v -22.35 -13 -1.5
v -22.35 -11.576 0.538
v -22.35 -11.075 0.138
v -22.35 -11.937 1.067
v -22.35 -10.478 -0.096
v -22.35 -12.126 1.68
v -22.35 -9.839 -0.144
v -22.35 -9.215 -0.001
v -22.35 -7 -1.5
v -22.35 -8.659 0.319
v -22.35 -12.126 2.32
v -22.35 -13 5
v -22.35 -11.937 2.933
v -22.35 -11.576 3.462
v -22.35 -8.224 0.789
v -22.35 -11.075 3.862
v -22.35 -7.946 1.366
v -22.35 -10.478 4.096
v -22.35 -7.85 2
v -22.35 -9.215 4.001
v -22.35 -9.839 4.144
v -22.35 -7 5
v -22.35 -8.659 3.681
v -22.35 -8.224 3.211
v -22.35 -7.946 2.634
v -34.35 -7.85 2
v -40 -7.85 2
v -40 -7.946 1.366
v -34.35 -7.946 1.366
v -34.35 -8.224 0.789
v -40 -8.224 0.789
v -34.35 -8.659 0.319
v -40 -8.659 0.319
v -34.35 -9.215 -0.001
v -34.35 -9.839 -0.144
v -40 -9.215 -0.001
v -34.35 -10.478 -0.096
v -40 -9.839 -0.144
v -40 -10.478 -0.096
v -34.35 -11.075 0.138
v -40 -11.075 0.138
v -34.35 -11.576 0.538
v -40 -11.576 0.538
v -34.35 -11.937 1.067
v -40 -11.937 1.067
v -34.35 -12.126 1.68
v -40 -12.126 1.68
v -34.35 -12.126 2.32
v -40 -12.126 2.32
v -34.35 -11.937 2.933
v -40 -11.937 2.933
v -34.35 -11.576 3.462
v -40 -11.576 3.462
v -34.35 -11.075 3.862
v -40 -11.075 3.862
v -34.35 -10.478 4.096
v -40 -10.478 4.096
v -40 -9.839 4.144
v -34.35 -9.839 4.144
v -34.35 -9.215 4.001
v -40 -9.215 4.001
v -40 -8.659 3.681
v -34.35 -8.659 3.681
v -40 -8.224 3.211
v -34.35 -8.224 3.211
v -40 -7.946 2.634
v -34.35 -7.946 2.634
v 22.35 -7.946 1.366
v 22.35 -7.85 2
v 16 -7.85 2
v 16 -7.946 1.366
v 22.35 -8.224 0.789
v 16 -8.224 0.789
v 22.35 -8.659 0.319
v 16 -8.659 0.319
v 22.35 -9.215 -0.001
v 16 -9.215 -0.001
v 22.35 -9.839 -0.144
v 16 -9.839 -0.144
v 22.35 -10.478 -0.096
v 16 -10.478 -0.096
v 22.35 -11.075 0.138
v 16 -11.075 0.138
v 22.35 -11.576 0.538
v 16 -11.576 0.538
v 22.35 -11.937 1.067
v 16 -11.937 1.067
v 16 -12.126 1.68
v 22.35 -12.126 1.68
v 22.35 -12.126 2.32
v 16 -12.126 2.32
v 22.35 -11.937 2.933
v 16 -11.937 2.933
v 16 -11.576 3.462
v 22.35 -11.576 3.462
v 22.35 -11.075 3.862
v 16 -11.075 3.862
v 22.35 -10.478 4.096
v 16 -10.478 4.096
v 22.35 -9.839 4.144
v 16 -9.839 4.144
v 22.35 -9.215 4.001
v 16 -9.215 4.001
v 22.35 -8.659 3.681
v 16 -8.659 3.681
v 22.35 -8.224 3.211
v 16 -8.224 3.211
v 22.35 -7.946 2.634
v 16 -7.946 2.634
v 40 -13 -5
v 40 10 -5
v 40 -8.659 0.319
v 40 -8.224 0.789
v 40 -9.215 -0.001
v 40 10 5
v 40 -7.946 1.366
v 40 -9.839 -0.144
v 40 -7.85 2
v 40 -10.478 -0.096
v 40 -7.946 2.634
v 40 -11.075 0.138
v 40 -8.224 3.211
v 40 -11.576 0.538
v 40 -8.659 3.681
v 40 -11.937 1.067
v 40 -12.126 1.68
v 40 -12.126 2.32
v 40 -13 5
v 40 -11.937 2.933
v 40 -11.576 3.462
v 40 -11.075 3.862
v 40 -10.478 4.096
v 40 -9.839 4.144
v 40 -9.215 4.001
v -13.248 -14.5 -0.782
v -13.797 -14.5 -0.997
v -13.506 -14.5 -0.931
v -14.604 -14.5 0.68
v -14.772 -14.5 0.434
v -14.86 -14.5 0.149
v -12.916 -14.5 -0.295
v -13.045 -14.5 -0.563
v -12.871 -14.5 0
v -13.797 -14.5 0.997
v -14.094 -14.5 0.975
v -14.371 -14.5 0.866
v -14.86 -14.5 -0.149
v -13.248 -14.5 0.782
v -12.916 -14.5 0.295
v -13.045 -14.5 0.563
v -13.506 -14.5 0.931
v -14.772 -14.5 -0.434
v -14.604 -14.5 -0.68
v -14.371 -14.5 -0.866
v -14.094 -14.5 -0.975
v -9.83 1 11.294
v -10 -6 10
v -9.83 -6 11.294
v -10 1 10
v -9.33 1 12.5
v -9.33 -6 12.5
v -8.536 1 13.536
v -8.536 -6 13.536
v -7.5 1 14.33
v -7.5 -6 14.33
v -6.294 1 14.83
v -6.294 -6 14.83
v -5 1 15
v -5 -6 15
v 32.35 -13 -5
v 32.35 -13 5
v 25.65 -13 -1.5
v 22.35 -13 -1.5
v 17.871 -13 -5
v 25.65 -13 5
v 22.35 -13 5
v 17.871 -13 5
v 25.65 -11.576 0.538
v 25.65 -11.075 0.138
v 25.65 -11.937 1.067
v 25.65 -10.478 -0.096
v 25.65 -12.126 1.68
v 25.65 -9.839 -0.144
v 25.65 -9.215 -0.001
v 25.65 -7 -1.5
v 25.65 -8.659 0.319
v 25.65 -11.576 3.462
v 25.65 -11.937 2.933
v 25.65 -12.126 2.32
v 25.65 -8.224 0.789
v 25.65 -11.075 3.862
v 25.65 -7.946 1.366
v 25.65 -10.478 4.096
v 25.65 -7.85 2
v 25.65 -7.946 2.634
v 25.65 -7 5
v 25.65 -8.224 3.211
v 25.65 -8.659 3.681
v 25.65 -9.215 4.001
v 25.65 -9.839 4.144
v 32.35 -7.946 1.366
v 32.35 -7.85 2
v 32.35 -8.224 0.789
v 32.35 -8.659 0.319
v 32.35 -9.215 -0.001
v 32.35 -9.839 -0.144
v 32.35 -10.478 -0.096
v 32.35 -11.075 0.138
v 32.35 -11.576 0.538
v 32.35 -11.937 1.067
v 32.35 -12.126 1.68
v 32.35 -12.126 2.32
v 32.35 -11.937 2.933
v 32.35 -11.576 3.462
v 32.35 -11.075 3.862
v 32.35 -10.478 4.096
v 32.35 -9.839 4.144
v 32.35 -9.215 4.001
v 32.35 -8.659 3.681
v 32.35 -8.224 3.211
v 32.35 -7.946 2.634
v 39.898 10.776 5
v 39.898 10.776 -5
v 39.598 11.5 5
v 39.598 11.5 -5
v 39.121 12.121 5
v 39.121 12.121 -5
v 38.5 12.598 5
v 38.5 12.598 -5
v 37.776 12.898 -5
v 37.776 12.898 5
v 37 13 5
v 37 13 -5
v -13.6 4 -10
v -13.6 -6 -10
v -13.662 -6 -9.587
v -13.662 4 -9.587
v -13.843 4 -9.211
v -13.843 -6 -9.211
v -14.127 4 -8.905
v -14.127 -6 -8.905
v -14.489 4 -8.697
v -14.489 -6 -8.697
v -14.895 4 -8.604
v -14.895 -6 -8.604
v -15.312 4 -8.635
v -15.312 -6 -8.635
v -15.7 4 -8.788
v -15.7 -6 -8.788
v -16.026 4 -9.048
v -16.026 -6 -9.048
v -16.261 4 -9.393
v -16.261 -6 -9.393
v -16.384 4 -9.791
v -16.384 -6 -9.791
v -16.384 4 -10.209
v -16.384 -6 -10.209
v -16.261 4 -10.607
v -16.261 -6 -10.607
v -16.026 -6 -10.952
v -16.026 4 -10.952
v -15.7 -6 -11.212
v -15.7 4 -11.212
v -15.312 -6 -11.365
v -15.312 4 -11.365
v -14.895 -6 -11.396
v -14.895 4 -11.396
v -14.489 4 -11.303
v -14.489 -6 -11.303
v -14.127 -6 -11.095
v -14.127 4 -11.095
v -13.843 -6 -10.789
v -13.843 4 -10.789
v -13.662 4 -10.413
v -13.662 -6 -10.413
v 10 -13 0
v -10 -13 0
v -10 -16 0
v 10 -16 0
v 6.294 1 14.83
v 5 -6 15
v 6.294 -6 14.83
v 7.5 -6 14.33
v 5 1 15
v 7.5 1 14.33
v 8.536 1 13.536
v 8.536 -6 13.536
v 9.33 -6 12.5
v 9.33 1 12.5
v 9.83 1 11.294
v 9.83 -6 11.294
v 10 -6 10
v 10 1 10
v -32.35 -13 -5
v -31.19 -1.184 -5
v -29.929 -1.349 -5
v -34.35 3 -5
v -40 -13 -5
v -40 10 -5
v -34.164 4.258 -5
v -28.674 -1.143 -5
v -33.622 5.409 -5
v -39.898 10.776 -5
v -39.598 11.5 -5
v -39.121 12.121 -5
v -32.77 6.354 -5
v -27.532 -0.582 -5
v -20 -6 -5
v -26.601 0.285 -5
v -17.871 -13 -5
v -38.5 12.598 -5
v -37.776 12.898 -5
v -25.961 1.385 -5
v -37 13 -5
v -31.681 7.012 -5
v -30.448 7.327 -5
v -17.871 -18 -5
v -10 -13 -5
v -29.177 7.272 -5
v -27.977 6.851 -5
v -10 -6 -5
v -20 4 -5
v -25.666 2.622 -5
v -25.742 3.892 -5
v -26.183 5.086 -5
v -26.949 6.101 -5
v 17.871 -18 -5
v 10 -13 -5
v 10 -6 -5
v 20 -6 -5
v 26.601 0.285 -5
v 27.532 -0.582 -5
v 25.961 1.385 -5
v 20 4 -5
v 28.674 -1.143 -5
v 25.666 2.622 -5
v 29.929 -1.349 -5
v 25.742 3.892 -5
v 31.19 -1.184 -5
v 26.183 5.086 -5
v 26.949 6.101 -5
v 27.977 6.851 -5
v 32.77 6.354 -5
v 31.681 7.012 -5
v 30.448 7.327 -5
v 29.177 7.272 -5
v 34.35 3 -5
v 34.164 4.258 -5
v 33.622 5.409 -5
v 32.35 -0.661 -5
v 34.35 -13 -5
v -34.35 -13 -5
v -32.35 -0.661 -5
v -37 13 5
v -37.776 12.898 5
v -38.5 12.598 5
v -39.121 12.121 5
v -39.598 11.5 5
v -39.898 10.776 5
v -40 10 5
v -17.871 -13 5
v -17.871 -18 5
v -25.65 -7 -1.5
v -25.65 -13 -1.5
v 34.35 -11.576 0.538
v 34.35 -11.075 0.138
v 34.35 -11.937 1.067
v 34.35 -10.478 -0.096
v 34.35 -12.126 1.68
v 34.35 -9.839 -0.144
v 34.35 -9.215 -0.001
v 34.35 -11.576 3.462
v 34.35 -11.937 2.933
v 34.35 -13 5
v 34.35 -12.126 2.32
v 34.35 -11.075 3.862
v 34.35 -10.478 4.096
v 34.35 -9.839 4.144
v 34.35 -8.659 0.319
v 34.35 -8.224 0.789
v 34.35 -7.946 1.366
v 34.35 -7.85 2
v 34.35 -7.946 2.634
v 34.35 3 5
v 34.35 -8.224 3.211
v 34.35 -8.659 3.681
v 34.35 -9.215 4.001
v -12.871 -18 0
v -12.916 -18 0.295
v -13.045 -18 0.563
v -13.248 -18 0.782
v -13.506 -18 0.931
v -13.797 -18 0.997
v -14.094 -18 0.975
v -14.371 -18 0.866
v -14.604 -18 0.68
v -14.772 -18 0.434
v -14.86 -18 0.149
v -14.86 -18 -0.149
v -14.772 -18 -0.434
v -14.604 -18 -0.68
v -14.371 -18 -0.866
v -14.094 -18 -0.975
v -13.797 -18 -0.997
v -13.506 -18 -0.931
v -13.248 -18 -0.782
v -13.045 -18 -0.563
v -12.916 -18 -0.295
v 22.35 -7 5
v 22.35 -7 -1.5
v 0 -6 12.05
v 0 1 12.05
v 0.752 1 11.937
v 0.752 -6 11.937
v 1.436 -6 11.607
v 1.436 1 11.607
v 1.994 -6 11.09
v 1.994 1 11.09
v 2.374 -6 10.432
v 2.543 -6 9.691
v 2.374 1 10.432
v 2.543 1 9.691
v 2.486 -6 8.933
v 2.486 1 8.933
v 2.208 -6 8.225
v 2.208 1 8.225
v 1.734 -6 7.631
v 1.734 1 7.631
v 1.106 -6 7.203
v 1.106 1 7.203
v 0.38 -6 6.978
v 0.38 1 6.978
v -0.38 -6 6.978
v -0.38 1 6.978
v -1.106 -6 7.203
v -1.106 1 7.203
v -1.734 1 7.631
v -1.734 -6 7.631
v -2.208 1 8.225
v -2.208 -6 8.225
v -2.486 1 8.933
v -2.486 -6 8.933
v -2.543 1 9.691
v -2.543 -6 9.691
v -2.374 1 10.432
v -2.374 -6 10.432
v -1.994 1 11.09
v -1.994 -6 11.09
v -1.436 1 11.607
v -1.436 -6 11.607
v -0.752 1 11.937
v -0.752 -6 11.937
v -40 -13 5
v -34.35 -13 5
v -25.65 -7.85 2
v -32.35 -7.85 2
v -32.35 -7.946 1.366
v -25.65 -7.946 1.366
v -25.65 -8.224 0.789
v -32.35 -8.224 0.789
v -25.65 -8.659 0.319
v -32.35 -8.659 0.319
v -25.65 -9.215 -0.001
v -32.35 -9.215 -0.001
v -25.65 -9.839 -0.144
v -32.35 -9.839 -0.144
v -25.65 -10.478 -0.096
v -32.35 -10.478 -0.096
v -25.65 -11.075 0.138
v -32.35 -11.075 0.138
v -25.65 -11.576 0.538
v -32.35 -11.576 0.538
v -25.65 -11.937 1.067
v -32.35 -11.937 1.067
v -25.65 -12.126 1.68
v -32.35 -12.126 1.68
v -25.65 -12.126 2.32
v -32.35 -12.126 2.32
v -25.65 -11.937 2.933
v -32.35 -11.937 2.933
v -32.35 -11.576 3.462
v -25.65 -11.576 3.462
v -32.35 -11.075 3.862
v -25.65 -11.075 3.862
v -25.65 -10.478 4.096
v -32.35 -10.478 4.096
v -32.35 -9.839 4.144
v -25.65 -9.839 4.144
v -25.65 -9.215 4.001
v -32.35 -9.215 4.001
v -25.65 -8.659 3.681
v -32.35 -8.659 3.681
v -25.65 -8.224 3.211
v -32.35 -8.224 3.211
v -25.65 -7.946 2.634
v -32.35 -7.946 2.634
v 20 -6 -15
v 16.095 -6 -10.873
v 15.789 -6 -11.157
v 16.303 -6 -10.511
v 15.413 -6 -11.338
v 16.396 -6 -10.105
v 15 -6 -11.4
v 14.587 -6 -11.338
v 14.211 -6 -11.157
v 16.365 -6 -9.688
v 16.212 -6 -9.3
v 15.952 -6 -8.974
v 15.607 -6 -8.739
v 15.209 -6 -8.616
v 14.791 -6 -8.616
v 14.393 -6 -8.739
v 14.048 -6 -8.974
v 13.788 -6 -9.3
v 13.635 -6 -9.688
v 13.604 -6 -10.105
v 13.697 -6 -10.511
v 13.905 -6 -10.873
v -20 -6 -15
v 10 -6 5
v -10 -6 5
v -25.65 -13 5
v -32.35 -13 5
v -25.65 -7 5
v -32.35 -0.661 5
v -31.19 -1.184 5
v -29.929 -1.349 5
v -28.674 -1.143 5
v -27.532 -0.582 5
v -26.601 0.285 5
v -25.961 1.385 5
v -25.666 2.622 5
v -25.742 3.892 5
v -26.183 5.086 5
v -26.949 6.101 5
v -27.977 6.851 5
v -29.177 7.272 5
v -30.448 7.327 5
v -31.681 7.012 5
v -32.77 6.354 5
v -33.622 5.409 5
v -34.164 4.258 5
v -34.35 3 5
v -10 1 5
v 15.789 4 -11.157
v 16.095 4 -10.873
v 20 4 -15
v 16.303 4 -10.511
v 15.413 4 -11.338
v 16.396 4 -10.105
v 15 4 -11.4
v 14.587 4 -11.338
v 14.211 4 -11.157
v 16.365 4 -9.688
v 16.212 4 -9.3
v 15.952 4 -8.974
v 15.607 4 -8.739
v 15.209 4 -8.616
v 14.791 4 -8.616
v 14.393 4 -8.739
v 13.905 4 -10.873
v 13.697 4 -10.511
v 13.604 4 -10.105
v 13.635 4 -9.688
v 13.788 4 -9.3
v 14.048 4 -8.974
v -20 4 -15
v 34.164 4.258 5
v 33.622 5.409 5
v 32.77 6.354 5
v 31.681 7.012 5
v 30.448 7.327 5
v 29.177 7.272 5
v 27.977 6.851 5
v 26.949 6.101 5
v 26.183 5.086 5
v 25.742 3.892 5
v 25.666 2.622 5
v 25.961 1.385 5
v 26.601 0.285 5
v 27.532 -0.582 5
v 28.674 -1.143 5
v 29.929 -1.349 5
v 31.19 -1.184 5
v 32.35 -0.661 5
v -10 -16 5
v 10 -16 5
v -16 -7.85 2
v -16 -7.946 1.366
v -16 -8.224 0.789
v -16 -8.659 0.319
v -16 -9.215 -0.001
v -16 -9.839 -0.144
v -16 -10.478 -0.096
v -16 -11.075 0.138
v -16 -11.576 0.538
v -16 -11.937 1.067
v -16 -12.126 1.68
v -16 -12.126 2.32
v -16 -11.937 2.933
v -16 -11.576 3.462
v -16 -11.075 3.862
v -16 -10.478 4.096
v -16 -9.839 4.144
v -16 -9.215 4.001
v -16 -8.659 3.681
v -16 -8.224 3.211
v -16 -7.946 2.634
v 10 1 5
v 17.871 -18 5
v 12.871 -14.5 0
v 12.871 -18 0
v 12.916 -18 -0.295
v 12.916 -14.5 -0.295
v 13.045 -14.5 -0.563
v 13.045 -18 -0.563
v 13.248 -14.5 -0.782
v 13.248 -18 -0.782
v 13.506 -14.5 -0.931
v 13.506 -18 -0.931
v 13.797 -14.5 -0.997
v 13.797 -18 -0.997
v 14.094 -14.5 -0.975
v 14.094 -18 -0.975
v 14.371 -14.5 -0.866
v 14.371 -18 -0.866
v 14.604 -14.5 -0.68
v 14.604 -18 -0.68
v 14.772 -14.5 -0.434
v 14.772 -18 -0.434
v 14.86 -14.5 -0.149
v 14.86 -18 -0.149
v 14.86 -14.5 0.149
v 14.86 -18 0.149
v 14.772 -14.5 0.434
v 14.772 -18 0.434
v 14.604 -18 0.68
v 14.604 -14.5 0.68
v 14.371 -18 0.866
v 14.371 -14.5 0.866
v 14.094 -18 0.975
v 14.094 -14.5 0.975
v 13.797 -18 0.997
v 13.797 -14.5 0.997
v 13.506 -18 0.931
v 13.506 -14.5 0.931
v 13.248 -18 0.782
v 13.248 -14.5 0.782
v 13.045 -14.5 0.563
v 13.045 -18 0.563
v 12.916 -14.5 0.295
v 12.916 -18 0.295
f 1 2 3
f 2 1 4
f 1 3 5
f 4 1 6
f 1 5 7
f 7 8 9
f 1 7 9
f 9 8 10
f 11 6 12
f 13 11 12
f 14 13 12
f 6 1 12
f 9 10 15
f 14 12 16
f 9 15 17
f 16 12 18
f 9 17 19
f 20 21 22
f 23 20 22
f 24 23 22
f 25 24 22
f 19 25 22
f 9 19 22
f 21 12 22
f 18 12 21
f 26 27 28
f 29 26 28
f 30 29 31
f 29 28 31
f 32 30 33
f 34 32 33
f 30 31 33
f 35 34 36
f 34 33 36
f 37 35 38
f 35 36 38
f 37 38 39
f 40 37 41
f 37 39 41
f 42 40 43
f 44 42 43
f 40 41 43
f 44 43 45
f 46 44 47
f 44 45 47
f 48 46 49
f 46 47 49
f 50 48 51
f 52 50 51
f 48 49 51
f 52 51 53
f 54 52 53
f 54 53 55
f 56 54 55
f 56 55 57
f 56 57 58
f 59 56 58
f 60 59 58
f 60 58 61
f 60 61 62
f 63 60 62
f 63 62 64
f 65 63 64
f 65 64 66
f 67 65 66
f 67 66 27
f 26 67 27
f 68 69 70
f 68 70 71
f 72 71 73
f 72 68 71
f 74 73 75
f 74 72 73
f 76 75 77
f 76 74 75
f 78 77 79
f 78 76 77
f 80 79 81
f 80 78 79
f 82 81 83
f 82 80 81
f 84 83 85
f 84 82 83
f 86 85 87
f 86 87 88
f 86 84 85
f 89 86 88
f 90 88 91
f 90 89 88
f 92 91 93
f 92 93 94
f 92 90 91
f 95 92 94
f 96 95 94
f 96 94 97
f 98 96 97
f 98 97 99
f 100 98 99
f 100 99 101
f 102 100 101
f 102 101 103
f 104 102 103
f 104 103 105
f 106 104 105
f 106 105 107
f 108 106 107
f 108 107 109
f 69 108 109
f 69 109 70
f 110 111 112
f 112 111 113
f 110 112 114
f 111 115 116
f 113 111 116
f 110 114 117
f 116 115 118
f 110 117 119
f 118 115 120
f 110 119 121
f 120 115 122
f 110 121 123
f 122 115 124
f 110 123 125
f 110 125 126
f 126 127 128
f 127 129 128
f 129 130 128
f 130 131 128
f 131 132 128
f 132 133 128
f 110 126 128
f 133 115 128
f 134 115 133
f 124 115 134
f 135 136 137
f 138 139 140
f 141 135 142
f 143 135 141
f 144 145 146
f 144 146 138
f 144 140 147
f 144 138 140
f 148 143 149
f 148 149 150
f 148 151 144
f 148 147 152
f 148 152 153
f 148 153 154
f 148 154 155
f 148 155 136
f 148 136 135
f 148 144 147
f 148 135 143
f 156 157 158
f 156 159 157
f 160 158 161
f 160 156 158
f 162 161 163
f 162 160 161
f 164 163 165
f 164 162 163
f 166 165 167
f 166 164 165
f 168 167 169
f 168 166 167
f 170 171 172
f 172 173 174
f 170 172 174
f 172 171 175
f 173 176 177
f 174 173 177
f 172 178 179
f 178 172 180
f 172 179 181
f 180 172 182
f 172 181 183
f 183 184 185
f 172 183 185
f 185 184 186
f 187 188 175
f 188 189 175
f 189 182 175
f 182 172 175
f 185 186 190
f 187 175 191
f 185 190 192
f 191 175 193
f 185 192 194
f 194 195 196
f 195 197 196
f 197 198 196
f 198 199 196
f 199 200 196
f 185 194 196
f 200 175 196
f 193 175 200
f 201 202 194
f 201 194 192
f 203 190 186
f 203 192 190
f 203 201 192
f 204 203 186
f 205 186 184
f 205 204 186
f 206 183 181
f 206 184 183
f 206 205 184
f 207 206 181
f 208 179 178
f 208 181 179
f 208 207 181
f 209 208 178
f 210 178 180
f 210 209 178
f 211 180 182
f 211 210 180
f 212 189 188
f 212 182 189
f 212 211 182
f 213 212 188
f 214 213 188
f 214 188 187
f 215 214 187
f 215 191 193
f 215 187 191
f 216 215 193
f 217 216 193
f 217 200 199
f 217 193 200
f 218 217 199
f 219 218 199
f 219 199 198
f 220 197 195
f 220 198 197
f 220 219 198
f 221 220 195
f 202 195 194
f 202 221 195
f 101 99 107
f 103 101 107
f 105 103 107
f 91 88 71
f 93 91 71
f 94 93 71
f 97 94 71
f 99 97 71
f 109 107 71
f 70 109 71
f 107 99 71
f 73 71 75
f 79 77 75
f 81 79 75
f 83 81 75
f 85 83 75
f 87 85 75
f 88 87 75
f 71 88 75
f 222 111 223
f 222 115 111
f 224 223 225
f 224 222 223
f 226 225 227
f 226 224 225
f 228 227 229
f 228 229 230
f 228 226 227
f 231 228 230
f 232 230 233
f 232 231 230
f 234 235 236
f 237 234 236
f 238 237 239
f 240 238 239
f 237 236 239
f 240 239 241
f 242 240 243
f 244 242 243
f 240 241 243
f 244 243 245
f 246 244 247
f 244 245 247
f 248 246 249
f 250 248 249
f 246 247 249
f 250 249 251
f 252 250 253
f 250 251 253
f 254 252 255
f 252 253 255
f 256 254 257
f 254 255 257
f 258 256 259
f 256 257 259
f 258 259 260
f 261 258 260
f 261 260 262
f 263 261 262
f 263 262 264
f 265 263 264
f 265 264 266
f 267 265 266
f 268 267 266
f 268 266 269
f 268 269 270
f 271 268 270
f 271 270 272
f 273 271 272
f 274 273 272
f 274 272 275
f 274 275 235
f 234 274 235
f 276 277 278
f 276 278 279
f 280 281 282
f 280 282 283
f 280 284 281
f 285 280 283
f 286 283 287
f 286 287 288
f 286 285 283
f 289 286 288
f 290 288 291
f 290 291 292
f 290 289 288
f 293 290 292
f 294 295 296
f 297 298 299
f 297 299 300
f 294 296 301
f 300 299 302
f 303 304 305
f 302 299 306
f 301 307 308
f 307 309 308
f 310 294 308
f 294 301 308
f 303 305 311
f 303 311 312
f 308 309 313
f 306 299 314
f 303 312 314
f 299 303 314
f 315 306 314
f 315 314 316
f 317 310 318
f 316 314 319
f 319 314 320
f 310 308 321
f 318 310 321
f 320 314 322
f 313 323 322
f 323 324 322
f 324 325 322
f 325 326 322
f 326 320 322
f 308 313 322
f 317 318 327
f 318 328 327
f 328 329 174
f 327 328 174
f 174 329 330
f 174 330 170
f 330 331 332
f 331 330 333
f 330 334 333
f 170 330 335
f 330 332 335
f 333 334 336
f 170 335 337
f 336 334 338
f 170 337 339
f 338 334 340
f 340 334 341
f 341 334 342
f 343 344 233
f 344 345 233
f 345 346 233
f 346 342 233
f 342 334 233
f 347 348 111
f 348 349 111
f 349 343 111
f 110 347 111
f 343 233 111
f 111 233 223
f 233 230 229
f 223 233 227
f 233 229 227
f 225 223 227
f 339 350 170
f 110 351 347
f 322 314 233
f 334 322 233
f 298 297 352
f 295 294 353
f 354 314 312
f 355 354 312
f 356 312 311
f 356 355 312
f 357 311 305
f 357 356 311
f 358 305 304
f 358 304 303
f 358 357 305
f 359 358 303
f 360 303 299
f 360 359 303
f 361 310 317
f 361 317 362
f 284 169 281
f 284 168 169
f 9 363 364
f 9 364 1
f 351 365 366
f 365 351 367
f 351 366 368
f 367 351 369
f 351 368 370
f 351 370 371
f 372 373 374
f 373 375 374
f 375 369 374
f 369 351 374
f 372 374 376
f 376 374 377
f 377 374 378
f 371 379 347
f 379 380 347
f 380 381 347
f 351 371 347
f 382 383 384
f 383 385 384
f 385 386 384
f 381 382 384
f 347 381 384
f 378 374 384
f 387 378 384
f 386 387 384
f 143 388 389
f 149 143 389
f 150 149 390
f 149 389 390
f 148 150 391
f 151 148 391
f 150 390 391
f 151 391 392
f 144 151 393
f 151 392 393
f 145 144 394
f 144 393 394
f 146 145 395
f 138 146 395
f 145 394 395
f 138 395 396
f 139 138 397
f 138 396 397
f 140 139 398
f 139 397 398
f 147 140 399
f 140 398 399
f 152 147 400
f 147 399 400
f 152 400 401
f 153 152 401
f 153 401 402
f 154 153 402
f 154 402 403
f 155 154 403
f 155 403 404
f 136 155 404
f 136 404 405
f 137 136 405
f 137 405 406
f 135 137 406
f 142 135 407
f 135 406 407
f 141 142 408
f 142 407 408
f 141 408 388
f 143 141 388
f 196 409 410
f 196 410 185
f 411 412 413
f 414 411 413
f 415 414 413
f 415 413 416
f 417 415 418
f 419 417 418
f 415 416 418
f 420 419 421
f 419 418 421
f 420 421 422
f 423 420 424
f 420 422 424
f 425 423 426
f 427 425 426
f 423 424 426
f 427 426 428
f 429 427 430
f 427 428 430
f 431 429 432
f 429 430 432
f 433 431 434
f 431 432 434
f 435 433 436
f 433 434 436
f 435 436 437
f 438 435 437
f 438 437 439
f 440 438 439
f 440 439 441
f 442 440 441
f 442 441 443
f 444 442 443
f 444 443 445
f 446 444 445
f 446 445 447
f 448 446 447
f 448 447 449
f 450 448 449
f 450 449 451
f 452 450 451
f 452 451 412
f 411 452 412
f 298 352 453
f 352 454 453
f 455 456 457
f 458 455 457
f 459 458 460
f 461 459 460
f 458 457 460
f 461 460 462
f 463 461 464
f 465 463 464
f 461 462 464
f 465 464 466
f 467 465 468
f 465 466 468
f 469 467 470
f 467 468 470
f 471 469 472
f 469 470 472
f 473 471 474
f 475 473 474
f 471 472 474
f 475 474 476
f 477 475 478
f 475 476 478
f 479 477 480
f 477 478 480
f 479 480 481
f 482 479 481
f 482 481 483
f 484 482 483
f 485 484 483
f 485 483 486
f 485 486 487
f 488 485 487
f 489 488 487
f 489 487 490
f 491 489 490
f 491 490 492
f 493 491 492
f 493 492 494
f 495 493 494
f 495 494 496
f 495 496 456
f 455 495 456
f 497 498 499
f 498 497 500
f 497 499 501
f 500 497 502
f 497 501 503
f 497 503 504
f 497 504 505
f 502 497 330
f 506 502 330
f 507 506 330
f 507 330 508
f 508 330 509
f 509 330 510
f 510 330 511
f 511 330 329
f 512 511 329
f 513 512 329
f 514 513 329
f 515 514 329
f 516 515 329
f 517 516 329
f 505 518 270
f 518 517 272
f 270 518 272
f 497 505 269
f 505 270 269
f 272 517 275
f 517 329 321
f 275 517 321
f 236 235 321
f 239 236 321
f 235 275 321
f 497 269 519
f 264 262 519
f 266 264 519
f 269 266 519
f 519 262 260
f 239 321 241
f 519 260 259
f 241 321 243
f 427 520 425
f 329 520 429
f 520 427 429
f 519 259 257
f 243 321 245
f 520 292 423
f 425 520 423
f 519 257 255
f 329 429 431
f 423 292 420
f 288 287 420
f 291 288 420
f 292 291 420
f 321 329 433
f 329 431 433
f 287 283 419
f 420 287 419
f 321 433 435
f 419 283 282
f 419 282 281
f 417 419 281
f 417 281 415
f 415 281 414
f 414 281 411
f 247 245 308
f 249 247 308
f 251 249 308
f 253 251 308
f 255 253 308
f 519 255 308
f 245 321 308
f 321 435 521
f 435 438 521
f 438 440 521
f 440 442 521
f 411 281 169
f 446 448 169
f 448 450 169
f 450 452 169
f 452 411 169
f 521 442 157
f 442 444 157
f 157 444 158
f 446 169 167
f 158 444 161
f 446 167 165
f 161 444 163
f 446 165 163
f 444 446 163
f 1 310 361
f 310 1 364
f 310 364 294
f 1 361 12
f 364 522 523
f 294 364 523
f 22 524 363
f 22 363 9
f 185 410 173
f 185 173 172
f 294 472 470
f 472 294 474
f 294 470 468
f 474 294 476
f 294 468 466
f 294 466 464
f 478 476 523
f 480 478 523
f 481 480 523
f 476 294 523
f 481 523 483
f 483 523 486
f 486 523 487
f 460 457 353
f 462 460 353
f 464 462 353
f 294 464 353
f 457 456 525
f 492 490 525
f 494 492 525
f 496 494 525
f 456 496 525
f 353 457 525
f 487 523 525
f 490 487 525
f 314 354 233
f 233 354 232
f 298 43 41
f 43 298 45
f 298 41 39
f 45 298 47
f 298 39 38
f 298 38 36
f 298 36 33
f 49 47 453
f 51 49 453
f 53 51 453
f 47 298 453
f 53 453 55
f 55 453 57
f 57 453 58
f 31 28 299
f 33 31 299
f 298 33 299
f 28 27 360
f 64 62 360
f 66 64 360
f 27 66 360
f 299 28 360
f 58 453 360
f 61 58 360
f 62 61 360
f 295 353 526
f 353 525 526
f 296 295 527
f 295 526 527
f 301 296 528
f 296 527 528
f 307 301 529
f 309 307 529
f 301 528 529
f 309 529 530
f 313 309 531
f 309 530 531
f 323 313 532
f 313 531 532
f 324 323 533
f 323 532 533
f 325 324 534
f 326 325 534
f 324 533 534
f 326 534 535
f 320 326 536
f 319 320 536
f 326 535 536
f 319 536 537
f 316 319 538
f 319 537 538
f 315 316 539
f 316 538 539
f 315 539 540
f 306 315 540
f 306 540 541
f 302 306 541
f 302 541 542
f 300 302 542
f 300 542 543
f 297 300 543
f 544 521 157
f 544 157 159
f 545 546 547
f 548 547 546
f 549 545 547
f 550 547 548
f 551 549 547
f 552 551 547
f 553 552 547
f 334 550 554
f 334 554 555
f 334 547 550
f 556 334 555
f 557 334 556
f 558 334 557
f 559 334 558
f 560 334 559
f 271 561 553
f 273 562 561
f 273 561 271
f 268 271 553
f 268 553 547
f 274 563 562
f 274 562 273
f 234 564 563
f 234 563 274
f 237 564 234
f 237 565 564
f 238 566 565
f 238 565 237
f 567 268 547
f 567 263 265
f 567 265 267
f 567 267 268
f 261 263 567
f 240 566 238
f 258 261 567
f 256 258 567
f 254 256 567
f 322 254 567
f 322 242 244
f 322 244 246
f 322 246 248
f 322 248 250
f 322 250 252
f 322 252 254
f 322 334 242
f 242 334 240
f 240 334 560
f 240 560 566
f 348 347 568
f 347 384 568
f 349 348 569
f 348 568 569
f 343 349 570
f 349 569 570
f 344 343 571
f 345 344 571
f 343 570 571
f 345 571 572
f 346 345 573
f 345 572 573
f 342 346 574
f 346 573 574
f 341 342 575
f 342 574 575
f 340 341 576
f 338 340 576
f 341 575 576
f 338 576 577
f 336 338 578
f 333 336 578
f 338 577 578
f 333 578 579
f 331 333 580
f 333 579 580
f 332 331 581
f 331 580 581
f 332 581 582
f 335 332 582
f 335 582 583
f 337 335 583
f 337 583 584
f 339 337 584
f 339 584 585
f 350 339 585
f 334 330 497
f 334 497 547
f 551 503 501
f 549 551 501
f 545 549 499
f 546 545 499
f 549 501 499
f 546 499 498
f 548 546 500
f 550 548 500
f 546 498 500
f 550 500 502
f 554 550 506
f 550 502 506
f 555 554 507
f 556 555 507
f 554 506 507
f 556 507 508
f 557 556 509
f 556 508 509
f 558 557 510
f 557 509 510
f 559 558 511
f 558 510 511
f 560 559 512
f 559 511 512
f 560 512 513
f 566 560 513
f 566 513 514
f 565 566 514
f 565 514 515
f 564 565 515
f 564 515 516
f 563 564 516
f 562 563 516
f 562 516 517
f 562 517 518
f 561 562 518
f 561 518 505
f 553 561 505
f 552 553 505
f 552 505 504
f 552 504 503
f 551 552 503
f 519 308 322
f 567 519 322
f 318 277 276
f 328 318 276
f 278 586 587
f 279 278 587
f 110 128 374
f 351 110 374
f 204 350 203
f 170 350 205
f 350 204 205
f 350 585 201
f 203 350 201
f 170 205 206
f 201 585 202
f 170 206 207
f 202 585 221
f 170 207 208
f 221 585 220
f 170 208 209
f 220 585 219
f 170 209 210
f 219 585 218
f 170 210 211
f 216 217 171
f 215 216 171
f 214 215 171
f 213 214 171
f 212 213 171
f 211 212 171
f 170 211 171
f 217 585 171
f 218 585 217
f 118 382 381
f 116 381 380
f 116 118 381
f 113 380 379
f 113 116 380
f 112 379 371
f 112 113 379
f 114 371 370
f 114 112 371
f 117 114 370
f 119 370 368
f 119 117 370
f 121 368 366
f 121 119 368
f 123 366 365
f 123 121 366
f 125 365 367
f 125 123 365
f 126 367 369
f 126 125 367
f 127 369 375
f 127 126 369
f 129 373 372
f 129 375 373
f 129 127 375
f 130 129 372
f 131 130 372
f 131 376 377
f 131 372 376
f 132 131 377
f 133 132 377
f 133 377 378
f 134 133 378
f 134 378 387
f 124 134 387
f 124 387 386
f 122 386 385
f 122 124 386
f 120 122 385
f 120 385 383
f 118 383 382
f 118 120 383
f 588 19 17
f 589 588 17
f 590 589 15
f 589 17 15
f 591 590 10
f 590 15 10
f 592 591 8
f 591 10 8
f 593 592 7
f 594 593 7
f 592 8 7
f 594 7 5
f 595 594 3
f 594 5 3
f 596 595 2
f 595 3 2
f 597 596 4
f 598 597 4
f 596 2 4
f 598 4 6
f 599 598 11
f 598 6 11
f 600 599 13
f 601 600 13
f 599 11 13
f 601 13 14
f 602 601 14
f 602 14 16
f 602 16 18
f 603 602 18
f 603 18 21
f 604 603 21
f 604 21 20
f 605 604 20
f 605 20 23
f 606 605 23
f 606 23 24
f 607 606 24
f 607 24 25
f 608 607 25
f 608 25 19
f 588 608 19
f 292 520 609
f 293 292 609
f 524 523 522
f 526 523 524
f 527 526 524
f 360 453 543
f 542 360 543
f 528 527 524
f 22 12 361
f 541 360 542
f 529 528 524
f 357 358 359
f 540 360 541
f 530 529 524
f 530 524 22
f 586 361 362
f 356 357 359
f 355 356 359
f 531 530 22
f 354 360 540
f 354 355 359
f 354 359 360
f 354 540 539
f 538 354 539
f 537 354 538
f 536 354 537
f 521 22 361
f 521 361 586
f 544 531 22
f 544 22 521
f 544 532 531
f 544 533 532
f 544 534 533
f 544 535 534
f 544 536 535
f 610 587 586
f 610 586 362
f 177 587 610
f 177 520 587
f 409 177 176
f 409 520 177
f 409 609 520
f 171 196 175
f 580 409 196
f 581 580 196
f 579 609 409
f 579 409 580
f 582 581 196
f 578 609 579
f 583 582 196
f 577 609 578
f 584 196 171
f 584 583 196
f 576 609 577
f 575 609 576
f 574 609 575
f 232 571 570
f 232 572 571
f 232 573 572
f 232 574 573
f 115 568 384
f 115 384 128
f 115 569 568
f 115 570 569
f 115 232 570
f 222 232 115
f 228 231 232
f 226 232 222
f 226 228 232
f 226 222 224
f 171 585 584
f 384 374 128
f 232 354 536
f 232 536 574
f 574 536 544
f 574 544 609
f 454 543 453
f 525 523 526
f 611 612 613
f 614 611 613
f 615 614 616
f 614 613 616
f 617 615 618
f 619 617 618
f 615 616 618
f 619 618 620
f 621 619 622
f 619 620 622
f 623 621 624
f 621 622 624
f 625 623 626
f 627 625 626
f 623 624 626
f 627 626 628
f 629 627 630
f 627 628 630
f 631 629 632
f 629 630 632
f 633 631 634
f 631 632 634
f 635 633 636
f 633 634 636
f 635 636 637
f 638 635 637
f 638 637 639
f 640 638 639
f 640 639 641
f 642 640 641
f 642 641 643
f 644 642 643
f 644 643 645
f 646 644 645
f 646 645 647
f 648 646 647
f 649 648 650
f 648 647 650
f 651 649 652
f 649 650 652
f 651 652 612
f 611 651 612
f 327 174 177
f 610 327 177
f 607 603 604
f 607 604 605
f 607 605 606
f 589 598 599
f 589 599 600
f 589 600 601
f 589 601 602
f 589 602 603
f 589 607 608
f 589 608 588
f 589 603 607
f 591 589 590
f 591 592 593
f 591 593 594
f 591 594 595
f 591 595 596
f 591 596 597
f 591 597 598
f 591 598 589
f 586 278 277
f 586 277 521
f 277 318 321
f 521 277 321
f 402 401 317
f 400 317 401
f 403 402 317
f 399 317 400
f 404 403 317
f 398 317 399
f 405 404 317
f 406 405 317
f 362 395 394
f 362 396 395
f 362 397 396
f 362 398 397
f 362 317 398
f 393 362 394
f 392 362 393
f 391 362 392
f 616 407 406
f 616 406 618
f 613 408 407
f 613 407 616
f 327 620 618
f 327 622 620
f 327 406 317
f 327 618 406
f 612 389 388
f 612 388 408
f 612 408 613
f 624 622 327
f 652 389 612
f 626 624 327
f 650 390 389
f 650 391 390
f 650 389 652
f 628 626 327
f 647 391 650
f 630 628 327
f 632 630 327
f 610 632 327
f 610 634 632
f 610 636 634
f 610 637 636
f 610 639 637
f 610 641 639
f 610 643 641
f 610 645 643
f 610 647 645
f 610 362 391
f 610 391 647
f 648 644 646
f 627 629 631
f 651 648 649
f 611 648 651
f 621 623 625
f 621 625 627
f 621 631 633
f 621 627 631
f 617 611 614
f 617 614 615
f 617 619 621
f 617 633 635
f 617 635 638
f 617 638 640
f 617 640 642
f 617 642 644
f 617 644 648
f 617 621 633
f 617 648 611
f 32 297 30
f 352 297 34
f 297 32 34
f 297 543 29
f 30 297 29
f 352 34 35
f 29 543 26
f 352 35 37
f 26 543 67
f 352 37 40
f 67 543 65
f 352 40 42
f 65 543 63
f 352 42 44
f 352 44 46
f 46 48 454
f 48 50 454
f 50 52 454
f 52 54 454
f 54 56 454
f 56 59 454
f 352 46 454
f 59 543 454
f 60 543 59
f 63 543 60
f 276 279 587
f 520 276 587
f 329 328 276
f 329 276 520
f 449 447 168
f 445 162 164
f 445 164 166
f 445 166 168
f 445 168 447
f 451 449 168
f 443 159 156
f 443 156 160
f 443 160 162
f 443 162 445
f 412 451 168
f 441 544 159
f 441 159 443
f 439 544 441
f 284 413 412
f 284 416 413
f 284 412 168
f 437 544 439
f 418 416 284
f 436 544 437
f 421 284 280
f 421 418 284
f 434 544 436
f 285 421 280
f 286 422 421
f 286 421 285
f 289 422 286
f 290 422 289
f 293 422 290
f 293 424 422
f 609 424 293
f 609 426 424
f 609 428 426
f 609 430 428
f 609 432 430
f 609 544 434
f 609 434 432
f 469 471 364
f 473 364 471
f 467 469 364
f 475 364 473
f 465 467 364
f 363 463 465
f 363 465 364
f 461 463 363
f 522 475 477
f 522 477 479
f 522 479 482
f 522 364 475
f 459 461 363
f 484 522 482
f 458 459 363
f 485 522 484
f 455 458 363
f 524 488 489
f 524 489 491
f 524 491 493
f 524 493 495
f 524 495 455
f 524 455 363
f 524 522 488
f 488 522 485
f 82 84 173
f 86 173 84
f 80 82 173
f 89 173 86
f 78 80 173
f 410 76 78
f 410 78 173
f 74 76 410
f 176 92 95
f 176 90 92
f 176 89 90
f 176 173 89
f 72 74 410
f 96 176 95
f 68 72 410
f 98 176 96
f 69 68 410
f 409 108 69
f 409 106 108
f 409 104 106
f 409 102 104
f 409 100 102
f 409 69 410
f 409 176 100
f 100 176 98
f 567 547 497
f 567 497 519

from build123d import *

# Parameters (mm, degrees)
BOSS_EXTRUDE1_DEPTH = 5
SKETCH2_W           = 3.3
SKETCH2_H           = 6
CUT_EXTRUDE2_DEPTH  = 6.5
SKETCH3_R           = 2.15
CUT_EXTRUDE4_DEPTH  = 24
FILLET1_R           = 0.5
FILLET2_R           = 3
SKETCH5_W           = 10.2
SKETCH5_H           = 7
CUT_EXTRUDE5_DEPTH  = 44.231932642
SKETCH8_W           = 20
SKETCH8_H           = 7
CUT_EXTRUDE6_DEPTH  = 44.231932642
SKETCH9_W           = 20
SKETCH9_H           = 7
BOSS_EXTRUDE2_DEPTH = 10
SKETCH10_R          = 2.55
CUT_EXTRUDE7_DEPTH  = 45.955533586
FILLET3_R           = 5
SKETCH11_W          = 40
SKETCH11_H          = 10
BOSS_EXTRUDE3_DEPTH = 10
SKETCH13_W          = 35.742737896
SKETCH13_H          = 10
BOSS_EXTRUDE5_DEPTH = 5
SKETCH14_R          = 1.4
CUT_EXTRUDE8_DEPTH  = 47.75467891
SKETCH16_W          = 20
SKETCH16_H          = 3
CUT_EXTRUDE10_DEPTH = 5
SKETCH17_R          = 1
CUT_EXTRUDE11_DEPTH = 3.5


with BuildPart() as part:
    # Sketch1 → Boss-Extrude1 (new, symmetric)
    with BuildSketch(Plane.XY):
        with BuildLine():
            Line((40, -13), (34.35, -13))
            Line((34.35, -13), (34.35, 3))
            ThreePointArc((34.35, 3), (26.182605601, 5.085665361), (32.35, -0.660601044))
            Line((32.35, -0.660601044), (32.35, -13))
            Line((32.35, -13), (7.5, -13))
            Line((7.5, -13), (7.5, -6))
            Line((7.5, -6), (5.1, -6))
            Line((5.1, -6), (5.1, -13))
            Line((5.1, -13), (-5.1, -13))
            Line((-5.1, -13), (-5.1, -6))
            Line((-5.1, -6), (-7.5, -6))
            Line((-7.5, -6), (-7.5, -13))
            Line((-7.5, -13), (-32.35, -13))
            Line((-32.35, -13), (-32.35, -0.660601044))
            ThreePointArc((-32.35, -0.660601044), (-26.182605601, 5.085665361), (-34.35, 3))
            Line((-34.35, 3), (-34.35, -13))
            Line((-34.35, -13), (-40, -13))
            Line((-40, -13), (-40, 13))
            Line((-40, 13), (40, 13))
            Line((40, 13), (40, -13))
        make_face()
    extrude(amount=BOSS_EXTRUDE1_DEPTH, both=True)

    # Sketch2 → Cut-Extrude2 (cut)
    with BuildSketch(Plane.XY.offset(5)):
        with Locations((-24, -10)):
            Rectangle(SKETCH2_W, SKETCH2_H)
        with Locations((24, -10)):
            Rectangle(SKETCH2_W, SKETCH2_H)
    extrude(amount=-CUT_EXTRUDE2_DEPTH, mode=Mode.SUBTRACT)

    # Sketch3 → Cut-Extrude4 (cut)
    with BuildSketch(Plane.ZY.offset(40)):
        with Locations(Location((2, -10, 0), (0, 0, 90))):
            Circle(SKETCH3_R)
    cut_extrude4 = extrude(amount=-CUT_EXTRUDE4_DEPTH, mode=Mode.SUBTRACT)

    # Mirror1: Cut-Extrude4 across plane
    add(cut_extrude4.mirror(Plane(origin=(0, 0, 0), x_dir=(0, 0, 1), z_dir=(1, 0, 0))), mode=Mode.SUBTRACT)

    # Fillet1
    fillet1_edges = [part.edges().sort_by_distance(p)[0] for p in [
        (5.1, -9.5, -5),
        (-5.1, -9.5, -5),
    ]]
    fillet(fillet1_edges, radius=FILLET1_R)

    # Fillet2
    fillet2_edges = [part.edges().sort_by_distance(p)[0] for p in [
        (-40, 13, 0),
        (40, 13, 0),
    ]]
    fillet(fillet2_edges, radius=FILLET2_R)

    # Sketch5 → Cut-Extrude5 (cut, through all)
    with BuildSketch(Plane.XY.offset(5)):
        with Locations((0, -9.5)):
            Rectangle(SKETCH5_W, SKETCH5_H)
    extrude(amount=-CUT_EXTRUDE5_DEPTH, mode=Mode.SUBTRACT)

    # Sketch8 → Cut-Extrude6 (cut, through all)
    with BuildSketch(Plane(origin=(0, 0, -5), x_dir=(-1, 0, 0), z_dir=(0, 0, -1))):
        with Locations((0, -9.5)):
            Rectangle(SKETCH8_W, SKETCH8_H)
    extrude(amount=-CUT_EXTRUDE6_DEPTH, mode=Mode.SUBTRACT)

    # Sketch9 → Boss-Extrude2 (add)
    with BuildSketch(Plane.XY.offset(5)):
        with Locations((0, -2.5)):
            Rectangle(SKETCH9_W, SKETCH9_H)
    extrude(amount=BOSS_EXTRUDE2_DEPTH)

    # Sketch10 → Cut-Extrude7 (cut, through all)
    with BuildSketch(Plane(origin=(0, 1, 0), x_dir=(1, 0, 0), z_dir=(0, 1, 0))):
        with Locations(Location((0, -9.5, 0), (0, 0, 270))):
            Circle(SKETCH10_R)
    extrude(amount=-CUT_EXTRUDE7_DEPTH, mode=Mode.SUBTRACT)

    # Fillet3
    fillet3_edges = [part.edges().sort_by_distance(p)[0] for p in [
        (-10, -2.5, 15),
        (10, -2.5, 15),
    ]]
    fillet(fillet3_edges, radius=FILLET3_R)

    # Sketch11 → Boss-Extrude3 (add)
    with BuildSketch(Plane(origin=(0, 0, -5), x_dir=(-1, 0, 0), z_dir=(0, 0, -1))):
        with Locations((0, -1)):
            Rectangle(SKETCH11_W, SKETCH11_H)
    extrude(amount=BOSS_EXTRUDE3_DEPTH)

    # Sketch13 → Boss-Extrude5 (add)
    with BuildSketch(Plane.XZ.offset(13)):
        Rectangle(SKETCH13_W, SKETCH13_H)
    extrude(amount=BOSS_EXTRUDE5_DEPTH)

    # Sketch14 → Cut-Extrude8 (cut, through all)
    with BuildSketch(Plane.XZ.offset(6)):
        with Locations((-15, -10)):
            Circle(SKETCH14_R)
        with Locations(Location((15, -10, 0), (0, 0, 270))):
            Circle(SKETCH14_R)
    extrude(amount=-CUT_EXTRUDE8_DEPTH, mode=Mode.SUBTRACT)

    # Sketch16 → Cut-Extrude10 (cut)
    with BuildSketch(Plane.XY.offset(5)):
        with Locations((0, -14.5)):
            Rectangle(SKETCH16_W, SKETCH16_H)
    extrude(amount=-CUT_EXTRUDE10_DEPTH, mode=Mode.SUBTRACT)

    # Sketch17 → Cut-Extrude11 (cut)
    with BuildSketch(Plane.XZ.offset(18)):
        with Locations((-13.871368948, 0)):
            Circle(SKETCH17_R)
        with Locations(Location((13.871368948, 0, 0), (0, 0, 180))):
            Circle(SKETCH17_R)
    extrude(amount=-CUT_EXTRUDE11_DEPTH, mode=Mode.SUBTRACT)


solid = part.part
